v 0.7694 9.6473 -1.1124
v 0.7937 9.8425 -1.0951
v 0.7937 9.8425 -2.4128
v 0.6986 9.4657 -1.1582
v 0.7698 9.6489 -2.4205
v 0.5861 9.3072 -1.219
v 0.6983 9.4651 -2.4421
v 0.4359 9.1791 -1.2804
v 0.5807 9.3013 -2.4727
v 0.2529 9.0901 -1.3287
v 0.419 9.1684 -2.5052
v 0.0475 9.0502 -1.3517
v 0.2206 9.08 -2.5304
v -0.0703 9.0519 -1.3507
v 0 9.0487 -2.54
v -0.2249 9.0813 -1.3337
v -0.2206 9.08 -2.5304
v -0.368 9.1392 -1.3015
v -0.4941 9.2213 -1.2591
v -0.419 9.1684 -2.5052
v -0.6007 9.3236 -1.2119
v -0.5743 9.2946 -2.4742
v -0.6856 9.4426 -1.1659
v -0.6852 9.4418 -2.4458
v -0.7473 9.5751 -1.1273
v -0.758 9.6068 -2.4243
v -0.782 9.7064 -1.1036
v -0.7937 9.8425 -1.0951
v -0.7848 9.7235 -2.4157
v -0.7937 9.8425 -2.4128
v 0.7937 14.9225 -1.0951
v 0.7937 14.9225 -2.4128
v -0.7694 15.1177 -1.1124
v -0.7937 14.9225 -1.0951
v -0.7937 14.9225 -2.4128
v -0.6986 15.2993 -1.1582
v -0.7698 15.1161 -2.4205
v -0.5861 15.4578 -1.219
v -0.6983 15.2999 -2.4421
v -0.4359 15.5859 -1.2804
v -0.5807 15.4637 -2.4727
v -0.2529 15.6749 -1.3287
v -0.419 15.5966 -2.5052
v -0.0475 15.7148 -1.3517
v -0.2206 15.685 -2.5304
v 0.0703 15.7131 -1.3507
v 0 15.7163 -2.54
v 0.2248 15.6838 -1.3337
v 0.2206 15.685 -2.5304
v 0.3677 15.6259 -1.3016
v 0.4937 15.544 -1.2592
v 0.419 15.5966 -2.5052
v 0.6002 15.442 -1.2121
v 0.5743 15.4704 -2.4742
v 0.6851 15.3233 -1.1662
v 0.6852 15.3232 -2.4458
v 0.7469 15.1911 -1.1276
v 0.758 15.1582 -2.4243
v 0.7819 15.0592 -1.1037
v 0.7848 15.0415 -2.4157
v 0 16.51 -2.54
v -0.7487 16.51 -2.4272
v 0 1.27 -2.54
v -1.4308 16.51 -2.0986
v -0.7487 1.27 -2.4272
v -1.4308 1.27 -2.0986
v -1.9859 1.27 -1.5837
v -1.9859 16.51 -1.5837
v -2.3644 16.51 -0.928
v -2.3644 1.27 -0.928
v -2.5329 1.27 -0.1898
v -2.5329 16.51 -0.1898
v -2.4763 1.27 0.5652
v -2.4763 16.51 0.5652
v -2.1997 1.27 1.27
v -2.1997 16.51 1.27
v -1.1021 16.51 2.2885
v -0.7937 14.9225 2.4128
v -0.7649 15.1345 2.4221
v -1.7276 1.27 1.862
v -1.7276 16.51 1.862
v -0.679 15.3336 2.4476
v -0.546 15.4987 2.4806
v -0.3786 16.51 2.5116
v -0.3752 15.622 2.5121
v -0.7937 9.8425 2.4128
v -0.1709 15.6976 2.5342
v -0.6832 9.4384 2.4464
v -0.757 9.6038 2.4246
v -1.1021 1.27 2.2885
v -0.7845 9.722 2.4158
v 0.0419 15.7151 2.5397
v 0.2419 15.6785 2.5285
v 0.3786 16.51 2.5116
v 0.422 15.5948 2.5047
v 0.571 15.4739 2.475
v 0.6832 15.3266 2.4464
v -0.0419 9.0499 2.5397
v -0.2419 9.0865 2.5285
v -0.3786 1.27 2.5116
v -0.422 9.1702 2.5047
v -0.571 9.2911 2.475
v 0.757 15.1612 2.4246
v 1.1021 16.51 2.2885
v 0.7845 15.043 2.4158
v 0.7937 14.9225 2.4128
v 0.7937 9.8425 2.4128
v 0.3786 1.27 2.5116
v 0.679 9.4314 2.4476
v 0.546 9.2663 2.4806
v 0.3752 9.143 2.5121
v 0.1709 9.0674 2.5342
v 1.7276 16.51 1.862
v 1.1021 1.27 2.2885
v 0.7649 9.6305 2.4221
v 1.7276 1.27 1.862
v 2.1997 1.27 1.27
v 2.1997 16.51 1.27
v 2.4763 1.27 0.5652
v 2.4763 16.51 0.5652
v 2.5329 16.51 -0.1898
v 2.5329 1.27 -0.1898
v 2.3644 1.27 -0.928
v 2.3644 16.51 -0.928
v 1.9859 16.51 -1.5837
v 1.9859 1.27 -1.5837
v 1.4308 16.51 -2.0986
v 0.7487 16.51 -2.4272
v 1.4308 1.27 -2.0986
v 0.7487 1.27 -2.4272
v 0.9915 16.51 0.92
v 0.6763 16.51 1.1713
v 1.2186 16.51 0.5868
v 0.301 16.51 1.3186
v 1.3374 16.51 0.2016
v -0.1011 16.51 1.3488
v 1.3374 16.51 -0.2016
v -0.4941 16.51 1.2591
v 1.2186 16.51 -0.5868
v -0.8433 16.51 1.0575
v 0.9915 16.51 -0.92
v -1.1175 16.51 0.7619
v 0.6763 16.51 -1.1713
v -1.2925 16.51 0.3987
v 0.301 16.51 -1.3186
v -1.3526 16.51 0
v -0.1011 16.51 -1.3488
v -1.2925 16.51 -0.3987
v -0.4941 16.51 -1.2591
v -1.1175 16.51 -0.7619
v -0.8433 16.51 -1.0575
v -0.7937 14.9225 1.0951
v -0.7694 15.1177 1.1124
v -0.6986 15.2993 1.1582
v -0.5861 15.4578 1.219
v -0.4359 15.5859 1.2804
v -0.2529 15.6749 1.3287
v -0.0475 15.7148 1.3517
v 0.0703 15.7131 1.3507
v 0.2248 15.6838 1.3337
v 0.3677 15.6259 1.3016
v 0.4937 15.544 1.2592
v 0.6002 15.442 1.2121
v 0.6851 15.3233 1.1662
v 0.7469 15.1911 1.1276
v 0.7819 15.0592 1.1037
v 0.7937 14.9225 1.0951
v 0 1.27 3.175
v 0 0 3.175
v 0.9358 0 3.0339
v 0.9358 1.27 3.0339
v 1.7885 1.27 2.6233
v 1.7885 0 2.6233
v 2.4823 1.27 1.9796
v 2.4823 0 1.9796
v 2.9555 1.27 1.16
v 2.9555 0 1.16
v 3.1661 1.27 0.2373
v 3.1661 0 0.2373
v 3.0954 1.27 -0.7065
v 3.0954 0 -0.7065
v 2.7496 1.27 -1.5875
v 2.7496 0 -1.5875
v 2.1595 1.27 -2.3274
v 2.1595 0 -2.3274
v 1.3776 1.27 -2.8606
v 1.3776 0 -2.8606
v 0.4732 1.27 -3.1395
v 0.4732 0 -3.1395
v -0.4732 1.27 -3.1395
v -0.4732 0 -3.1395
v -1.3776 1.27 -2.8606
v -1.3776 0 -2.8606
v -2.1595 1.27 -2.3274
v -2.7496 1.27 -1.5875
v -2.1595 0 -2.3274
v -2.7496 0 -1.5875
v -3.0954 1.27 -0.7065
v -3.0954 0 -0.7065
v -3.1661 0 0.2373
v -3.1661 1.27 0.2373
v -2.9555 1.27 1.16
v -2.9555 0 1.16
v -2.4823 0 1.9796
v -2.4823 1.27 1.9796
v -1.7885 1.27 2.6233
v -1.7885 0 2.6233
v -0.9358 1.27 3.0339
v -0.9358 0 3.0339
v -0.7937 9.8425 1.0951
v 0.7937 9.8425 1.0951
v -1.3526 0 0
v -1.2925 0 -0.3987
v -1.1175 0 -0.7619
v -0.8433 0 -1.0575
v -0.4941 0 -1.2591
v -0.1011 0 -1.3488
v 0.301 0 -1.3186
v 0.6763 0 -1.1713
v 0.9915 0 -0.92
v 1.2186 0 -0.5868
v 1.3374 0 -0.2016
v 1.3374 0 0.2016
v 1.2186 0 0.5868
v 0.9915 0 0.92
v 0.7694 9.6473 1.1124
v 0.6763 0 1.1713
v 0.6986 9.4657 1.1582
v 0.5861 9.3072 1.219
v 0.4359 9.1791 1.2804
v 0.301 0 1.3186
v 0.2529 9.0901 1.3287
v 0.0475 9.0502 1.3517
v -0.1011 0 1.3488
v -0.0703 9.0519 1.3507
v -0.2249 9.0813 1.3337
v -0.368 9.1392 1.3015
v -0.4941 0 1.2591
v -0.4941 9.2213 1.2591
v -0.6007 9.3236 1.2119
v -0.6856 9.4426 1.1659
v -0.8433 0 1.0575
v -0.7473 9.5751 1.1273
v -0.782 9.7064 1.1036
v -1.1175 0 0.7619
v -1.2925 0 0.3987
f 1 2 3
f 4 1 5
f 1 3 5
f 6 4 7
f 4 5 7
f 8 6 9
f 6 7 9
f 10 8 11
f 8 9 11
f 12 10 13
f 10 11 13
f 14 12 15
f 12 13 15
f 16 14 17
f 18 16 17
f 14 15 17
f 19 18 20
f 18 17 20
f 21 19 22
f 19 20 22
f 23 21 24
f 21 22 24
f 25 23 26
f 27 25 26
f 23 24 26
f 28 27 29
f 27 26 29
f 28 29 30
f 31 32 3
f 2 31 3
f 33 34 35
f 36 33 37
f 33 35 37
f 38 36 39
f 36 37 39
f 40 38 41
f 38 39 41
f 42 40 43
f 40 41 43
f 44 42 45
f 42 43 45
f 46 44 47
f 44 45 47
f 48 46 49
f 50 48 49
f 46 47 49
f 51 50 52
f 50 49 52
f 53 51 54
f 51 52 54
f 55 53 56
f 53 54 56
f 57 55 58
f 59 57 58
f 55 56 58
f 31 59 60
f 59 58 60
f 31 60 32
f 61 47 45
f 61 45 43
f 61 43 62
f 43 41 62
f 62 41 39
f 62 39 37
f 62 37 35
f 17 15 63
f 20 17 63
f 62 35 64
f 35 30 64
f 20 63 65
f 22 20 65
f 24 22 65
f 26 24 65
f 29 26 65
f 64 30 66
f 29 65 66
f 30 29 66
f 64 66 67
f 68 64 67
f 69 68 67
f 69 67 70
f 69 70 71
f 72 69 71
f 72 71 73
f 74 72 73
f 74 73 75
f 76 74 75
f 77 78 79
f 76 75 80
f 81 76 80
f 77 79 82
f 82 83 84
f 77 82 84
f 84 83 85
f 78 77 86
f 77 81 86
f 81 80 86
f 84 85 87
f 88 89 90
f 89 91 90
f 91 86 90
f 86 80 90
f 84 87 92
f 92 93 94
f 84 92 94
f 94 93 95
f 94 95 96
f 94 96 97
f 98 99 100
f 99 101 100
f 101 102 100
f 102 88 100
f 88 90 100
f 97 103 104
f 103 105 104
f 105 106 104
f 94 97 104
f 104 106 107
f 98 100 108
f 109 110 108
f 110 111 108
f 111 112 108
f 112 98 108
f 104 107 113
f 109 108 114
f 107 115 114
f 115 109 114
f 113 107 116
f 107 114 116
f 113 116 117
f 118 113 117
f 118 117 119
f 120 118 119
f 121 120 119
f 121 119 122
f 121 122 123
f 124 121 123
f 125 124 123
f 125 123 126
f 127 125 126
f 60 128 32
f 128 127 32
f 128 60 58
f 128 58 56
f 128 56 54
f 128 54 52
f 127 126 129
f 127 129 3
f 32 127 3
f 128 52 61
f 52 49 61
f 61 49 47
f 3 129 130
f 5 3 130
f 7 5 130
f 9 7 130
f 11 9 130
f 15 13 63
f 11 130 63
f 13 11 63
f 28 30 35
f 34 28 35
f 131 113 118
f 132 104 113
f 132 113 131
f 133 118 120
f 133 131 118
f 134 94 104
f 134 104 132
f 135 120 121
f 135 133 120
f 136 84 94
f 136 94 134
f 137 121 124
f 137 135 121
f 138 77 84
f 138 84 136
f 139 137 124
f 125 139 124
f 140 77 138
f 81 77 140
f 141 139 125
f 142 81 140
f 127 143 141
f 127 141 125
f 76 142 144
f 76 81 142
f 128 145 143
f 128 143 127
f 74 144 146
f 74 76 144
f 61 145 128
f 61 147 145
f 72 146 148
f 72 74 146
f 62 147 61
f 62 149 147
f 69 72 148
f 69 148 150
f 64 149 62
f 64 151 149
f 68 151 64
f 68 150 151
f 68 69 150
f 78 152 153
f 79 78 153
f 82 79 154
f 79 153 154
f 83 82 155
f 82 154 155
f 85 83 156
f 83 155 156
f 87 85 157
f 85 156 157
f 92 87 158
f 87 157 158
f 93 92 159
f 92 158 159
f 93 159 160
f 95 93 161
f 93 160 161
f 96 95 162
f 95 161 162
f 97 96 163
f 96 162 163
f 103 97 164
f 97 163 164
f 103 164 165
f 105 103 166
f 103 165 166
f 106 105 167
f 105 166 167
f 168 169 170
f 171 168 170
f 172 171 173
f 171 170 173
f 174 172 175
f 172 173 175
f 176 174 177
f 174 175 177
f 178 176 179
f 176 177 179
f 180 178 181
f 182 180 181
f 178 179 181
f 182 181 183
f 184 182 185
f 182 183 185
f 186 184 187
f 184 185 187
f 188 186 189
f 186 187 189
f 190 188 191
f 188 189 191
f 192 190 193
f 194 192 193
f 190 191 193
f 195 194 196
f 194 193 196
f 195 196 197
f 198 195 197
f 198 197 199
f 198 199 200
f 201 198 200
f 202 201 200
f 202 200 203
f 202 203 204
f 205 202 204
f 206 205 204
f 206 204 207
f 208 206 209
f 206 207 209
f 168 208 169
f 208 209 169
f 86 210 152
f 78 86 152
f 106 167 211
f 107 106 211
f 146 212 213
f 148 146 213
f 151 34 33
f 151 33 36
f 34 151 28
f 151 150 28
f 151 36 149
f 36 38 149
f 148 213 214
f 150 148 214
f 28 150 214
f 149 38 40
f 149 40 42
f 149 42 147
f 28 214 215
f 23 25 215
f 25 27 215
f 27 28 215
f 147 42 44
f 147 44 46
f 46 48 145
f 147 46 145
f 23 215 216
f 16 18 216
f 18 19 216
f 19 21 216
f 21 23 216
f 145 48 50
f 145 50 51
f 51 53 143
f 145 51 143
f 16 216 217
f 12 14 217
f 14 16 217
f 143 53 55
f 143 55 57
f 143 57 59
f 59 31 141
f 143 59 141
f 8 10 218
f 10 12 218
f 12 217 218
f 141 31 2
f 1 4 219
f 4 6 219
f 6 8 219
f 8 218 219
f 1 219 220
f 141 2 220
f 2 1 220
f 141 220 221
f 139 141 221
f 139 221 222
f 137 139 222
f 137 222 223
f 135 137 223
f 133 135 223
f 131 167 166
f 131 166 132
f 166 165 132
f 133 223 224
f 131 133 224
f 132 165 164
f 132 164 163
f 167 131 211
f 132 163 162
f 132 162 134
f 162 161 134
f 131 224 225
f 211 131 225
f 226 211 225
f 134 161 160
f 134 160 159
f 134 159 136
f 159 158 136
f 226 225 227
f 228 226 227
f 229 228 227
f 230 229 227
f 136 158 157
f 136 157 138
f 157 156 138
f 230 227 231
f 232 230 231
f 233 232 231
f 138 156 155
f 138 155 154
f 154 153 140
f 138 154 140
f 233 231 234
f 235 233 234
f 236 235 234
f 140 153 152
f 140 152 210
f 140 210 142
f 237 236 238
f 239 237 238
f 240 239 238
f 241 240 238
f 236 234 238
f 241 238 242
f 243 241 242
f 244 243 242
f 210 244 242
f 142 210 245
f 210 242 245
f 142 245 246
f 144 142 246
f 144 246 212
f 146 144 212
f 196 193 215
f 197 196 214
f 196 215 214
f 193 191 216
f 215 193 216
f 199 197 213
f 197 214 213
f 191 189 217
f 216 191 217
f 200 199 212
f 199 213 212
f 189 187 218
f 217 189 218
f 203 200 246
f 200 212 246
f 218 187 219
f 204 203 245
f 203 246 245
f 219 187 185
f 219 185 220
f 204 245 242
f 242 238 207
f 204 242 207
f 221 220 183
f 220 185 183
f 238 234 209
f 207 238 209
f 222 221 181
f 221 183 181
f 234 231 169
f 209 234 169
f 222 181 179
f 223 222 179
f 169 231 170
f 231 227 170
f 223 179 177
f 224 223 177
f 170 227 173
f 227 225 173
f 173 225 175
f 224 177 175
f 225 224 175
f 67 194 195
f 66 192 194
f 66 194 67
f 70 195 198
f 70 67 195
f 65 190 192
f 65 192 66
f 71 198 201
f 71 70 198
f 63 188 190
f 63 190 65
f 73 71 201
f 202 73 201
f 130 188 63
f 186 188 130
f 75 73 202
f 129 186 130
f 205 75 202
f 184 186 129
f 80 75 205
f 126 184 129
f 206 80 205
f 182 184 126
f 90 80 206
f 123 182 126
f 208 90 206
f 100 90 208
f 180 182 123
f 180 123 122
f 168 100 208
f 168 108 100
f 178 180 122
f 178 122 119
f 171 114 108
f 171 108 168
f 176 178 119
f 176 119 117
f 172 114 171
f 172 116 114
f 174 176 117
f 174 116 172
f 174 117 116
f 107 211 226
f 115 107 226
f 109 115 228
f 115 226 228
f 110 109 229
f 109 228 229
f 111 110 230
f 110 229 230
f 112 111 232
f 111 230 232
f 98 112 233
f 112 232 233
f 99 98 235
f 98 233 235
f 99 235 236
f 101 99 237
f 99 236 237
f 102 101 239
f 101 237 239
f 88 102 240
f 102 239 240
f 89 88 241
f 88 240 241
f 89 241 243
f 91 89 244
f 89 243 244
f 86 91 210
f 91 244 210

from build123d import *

# Parameters (mm, degrees)
SKETCH1_R                 = 3.175
BOSS_EXTRUDE1_DEPTH       = 1.27
SKETCH2_R                 = 2.54
BOSS_EXTRUDE2_DEPTH       = 15.24
TAP_DRILL_FOR_6_32_TAP1_D = 2.7051
CUT_EXTRUDE1_DEPTH        = 18.109685853
CUT_EXTRUDE1_DEPTH_BACK   = 18.109685853


with BuildPart() as part:
    # Sketch1 → Boss-Extrude1 (new body)
    with BuildSketch(Plane(origin=(0, 0, 0), x_dir=(1, 0, 0), z_dir=(0, 1, 0))):
        with Locations(Location((0, 0, 0), (0, 0, 270))):
            Circle(SKETCH1_R)
    extrude(amount=BOSS_EXTRUDE1_DEPTH)

    # Sketch2 → Boss-Extrude2 (add)
    with BuildSketch(Plane(origin=(0, 1.27, 0), x_dir=(1, 0, 0), z_dir=(0, 1, 0))):
        with Locations(Location((0, 0, 0), (0, 0, 90))):
            Circle(SKETCH2_R)
    extrude(amount=BOSS_EXTRUDE2_DEPTH)

    # Tap Drill for #6-32 Tap1 (through all)
    with Locations(Plane(origin=(0, 16.51, 0), x_dir=(1, 0, 0), z_dir=(0, 1, 0))):
        with Locations((0, 0)):
            Hole(TAP_DRILL_FOR_6_32_TAP1_D / 2)

    # Sketch6 → Cut-Extrude1 (cut, two sides: drawn at the far end of the back side and taken through both)
    with BuildSketch(Plane.XY.offset(-CUT_EXTRUDE1_DEPTH_BACK)):
        with BuildLine():
            Line((0.79375, 14.9225), (0.79375, 9.8425))
            ThreePointArc((0.79375, 9.8425), (0, 9.04875), (-0.79375, 9.8425))
            Line((-0.79375, 9.8425), (-0.79375, 14.9225))
            ThreePointArc((-0.79375, 14.9225), (0, 15.71625), (0.79375, 14.9225))
        make_face()
    extrude(amount=CUT_EXTRUDE1_DEPTH + CUT_EXTRUDE1_DEPTH_BACK, mode=Mode.SUBTRACT)


solid = part.part
